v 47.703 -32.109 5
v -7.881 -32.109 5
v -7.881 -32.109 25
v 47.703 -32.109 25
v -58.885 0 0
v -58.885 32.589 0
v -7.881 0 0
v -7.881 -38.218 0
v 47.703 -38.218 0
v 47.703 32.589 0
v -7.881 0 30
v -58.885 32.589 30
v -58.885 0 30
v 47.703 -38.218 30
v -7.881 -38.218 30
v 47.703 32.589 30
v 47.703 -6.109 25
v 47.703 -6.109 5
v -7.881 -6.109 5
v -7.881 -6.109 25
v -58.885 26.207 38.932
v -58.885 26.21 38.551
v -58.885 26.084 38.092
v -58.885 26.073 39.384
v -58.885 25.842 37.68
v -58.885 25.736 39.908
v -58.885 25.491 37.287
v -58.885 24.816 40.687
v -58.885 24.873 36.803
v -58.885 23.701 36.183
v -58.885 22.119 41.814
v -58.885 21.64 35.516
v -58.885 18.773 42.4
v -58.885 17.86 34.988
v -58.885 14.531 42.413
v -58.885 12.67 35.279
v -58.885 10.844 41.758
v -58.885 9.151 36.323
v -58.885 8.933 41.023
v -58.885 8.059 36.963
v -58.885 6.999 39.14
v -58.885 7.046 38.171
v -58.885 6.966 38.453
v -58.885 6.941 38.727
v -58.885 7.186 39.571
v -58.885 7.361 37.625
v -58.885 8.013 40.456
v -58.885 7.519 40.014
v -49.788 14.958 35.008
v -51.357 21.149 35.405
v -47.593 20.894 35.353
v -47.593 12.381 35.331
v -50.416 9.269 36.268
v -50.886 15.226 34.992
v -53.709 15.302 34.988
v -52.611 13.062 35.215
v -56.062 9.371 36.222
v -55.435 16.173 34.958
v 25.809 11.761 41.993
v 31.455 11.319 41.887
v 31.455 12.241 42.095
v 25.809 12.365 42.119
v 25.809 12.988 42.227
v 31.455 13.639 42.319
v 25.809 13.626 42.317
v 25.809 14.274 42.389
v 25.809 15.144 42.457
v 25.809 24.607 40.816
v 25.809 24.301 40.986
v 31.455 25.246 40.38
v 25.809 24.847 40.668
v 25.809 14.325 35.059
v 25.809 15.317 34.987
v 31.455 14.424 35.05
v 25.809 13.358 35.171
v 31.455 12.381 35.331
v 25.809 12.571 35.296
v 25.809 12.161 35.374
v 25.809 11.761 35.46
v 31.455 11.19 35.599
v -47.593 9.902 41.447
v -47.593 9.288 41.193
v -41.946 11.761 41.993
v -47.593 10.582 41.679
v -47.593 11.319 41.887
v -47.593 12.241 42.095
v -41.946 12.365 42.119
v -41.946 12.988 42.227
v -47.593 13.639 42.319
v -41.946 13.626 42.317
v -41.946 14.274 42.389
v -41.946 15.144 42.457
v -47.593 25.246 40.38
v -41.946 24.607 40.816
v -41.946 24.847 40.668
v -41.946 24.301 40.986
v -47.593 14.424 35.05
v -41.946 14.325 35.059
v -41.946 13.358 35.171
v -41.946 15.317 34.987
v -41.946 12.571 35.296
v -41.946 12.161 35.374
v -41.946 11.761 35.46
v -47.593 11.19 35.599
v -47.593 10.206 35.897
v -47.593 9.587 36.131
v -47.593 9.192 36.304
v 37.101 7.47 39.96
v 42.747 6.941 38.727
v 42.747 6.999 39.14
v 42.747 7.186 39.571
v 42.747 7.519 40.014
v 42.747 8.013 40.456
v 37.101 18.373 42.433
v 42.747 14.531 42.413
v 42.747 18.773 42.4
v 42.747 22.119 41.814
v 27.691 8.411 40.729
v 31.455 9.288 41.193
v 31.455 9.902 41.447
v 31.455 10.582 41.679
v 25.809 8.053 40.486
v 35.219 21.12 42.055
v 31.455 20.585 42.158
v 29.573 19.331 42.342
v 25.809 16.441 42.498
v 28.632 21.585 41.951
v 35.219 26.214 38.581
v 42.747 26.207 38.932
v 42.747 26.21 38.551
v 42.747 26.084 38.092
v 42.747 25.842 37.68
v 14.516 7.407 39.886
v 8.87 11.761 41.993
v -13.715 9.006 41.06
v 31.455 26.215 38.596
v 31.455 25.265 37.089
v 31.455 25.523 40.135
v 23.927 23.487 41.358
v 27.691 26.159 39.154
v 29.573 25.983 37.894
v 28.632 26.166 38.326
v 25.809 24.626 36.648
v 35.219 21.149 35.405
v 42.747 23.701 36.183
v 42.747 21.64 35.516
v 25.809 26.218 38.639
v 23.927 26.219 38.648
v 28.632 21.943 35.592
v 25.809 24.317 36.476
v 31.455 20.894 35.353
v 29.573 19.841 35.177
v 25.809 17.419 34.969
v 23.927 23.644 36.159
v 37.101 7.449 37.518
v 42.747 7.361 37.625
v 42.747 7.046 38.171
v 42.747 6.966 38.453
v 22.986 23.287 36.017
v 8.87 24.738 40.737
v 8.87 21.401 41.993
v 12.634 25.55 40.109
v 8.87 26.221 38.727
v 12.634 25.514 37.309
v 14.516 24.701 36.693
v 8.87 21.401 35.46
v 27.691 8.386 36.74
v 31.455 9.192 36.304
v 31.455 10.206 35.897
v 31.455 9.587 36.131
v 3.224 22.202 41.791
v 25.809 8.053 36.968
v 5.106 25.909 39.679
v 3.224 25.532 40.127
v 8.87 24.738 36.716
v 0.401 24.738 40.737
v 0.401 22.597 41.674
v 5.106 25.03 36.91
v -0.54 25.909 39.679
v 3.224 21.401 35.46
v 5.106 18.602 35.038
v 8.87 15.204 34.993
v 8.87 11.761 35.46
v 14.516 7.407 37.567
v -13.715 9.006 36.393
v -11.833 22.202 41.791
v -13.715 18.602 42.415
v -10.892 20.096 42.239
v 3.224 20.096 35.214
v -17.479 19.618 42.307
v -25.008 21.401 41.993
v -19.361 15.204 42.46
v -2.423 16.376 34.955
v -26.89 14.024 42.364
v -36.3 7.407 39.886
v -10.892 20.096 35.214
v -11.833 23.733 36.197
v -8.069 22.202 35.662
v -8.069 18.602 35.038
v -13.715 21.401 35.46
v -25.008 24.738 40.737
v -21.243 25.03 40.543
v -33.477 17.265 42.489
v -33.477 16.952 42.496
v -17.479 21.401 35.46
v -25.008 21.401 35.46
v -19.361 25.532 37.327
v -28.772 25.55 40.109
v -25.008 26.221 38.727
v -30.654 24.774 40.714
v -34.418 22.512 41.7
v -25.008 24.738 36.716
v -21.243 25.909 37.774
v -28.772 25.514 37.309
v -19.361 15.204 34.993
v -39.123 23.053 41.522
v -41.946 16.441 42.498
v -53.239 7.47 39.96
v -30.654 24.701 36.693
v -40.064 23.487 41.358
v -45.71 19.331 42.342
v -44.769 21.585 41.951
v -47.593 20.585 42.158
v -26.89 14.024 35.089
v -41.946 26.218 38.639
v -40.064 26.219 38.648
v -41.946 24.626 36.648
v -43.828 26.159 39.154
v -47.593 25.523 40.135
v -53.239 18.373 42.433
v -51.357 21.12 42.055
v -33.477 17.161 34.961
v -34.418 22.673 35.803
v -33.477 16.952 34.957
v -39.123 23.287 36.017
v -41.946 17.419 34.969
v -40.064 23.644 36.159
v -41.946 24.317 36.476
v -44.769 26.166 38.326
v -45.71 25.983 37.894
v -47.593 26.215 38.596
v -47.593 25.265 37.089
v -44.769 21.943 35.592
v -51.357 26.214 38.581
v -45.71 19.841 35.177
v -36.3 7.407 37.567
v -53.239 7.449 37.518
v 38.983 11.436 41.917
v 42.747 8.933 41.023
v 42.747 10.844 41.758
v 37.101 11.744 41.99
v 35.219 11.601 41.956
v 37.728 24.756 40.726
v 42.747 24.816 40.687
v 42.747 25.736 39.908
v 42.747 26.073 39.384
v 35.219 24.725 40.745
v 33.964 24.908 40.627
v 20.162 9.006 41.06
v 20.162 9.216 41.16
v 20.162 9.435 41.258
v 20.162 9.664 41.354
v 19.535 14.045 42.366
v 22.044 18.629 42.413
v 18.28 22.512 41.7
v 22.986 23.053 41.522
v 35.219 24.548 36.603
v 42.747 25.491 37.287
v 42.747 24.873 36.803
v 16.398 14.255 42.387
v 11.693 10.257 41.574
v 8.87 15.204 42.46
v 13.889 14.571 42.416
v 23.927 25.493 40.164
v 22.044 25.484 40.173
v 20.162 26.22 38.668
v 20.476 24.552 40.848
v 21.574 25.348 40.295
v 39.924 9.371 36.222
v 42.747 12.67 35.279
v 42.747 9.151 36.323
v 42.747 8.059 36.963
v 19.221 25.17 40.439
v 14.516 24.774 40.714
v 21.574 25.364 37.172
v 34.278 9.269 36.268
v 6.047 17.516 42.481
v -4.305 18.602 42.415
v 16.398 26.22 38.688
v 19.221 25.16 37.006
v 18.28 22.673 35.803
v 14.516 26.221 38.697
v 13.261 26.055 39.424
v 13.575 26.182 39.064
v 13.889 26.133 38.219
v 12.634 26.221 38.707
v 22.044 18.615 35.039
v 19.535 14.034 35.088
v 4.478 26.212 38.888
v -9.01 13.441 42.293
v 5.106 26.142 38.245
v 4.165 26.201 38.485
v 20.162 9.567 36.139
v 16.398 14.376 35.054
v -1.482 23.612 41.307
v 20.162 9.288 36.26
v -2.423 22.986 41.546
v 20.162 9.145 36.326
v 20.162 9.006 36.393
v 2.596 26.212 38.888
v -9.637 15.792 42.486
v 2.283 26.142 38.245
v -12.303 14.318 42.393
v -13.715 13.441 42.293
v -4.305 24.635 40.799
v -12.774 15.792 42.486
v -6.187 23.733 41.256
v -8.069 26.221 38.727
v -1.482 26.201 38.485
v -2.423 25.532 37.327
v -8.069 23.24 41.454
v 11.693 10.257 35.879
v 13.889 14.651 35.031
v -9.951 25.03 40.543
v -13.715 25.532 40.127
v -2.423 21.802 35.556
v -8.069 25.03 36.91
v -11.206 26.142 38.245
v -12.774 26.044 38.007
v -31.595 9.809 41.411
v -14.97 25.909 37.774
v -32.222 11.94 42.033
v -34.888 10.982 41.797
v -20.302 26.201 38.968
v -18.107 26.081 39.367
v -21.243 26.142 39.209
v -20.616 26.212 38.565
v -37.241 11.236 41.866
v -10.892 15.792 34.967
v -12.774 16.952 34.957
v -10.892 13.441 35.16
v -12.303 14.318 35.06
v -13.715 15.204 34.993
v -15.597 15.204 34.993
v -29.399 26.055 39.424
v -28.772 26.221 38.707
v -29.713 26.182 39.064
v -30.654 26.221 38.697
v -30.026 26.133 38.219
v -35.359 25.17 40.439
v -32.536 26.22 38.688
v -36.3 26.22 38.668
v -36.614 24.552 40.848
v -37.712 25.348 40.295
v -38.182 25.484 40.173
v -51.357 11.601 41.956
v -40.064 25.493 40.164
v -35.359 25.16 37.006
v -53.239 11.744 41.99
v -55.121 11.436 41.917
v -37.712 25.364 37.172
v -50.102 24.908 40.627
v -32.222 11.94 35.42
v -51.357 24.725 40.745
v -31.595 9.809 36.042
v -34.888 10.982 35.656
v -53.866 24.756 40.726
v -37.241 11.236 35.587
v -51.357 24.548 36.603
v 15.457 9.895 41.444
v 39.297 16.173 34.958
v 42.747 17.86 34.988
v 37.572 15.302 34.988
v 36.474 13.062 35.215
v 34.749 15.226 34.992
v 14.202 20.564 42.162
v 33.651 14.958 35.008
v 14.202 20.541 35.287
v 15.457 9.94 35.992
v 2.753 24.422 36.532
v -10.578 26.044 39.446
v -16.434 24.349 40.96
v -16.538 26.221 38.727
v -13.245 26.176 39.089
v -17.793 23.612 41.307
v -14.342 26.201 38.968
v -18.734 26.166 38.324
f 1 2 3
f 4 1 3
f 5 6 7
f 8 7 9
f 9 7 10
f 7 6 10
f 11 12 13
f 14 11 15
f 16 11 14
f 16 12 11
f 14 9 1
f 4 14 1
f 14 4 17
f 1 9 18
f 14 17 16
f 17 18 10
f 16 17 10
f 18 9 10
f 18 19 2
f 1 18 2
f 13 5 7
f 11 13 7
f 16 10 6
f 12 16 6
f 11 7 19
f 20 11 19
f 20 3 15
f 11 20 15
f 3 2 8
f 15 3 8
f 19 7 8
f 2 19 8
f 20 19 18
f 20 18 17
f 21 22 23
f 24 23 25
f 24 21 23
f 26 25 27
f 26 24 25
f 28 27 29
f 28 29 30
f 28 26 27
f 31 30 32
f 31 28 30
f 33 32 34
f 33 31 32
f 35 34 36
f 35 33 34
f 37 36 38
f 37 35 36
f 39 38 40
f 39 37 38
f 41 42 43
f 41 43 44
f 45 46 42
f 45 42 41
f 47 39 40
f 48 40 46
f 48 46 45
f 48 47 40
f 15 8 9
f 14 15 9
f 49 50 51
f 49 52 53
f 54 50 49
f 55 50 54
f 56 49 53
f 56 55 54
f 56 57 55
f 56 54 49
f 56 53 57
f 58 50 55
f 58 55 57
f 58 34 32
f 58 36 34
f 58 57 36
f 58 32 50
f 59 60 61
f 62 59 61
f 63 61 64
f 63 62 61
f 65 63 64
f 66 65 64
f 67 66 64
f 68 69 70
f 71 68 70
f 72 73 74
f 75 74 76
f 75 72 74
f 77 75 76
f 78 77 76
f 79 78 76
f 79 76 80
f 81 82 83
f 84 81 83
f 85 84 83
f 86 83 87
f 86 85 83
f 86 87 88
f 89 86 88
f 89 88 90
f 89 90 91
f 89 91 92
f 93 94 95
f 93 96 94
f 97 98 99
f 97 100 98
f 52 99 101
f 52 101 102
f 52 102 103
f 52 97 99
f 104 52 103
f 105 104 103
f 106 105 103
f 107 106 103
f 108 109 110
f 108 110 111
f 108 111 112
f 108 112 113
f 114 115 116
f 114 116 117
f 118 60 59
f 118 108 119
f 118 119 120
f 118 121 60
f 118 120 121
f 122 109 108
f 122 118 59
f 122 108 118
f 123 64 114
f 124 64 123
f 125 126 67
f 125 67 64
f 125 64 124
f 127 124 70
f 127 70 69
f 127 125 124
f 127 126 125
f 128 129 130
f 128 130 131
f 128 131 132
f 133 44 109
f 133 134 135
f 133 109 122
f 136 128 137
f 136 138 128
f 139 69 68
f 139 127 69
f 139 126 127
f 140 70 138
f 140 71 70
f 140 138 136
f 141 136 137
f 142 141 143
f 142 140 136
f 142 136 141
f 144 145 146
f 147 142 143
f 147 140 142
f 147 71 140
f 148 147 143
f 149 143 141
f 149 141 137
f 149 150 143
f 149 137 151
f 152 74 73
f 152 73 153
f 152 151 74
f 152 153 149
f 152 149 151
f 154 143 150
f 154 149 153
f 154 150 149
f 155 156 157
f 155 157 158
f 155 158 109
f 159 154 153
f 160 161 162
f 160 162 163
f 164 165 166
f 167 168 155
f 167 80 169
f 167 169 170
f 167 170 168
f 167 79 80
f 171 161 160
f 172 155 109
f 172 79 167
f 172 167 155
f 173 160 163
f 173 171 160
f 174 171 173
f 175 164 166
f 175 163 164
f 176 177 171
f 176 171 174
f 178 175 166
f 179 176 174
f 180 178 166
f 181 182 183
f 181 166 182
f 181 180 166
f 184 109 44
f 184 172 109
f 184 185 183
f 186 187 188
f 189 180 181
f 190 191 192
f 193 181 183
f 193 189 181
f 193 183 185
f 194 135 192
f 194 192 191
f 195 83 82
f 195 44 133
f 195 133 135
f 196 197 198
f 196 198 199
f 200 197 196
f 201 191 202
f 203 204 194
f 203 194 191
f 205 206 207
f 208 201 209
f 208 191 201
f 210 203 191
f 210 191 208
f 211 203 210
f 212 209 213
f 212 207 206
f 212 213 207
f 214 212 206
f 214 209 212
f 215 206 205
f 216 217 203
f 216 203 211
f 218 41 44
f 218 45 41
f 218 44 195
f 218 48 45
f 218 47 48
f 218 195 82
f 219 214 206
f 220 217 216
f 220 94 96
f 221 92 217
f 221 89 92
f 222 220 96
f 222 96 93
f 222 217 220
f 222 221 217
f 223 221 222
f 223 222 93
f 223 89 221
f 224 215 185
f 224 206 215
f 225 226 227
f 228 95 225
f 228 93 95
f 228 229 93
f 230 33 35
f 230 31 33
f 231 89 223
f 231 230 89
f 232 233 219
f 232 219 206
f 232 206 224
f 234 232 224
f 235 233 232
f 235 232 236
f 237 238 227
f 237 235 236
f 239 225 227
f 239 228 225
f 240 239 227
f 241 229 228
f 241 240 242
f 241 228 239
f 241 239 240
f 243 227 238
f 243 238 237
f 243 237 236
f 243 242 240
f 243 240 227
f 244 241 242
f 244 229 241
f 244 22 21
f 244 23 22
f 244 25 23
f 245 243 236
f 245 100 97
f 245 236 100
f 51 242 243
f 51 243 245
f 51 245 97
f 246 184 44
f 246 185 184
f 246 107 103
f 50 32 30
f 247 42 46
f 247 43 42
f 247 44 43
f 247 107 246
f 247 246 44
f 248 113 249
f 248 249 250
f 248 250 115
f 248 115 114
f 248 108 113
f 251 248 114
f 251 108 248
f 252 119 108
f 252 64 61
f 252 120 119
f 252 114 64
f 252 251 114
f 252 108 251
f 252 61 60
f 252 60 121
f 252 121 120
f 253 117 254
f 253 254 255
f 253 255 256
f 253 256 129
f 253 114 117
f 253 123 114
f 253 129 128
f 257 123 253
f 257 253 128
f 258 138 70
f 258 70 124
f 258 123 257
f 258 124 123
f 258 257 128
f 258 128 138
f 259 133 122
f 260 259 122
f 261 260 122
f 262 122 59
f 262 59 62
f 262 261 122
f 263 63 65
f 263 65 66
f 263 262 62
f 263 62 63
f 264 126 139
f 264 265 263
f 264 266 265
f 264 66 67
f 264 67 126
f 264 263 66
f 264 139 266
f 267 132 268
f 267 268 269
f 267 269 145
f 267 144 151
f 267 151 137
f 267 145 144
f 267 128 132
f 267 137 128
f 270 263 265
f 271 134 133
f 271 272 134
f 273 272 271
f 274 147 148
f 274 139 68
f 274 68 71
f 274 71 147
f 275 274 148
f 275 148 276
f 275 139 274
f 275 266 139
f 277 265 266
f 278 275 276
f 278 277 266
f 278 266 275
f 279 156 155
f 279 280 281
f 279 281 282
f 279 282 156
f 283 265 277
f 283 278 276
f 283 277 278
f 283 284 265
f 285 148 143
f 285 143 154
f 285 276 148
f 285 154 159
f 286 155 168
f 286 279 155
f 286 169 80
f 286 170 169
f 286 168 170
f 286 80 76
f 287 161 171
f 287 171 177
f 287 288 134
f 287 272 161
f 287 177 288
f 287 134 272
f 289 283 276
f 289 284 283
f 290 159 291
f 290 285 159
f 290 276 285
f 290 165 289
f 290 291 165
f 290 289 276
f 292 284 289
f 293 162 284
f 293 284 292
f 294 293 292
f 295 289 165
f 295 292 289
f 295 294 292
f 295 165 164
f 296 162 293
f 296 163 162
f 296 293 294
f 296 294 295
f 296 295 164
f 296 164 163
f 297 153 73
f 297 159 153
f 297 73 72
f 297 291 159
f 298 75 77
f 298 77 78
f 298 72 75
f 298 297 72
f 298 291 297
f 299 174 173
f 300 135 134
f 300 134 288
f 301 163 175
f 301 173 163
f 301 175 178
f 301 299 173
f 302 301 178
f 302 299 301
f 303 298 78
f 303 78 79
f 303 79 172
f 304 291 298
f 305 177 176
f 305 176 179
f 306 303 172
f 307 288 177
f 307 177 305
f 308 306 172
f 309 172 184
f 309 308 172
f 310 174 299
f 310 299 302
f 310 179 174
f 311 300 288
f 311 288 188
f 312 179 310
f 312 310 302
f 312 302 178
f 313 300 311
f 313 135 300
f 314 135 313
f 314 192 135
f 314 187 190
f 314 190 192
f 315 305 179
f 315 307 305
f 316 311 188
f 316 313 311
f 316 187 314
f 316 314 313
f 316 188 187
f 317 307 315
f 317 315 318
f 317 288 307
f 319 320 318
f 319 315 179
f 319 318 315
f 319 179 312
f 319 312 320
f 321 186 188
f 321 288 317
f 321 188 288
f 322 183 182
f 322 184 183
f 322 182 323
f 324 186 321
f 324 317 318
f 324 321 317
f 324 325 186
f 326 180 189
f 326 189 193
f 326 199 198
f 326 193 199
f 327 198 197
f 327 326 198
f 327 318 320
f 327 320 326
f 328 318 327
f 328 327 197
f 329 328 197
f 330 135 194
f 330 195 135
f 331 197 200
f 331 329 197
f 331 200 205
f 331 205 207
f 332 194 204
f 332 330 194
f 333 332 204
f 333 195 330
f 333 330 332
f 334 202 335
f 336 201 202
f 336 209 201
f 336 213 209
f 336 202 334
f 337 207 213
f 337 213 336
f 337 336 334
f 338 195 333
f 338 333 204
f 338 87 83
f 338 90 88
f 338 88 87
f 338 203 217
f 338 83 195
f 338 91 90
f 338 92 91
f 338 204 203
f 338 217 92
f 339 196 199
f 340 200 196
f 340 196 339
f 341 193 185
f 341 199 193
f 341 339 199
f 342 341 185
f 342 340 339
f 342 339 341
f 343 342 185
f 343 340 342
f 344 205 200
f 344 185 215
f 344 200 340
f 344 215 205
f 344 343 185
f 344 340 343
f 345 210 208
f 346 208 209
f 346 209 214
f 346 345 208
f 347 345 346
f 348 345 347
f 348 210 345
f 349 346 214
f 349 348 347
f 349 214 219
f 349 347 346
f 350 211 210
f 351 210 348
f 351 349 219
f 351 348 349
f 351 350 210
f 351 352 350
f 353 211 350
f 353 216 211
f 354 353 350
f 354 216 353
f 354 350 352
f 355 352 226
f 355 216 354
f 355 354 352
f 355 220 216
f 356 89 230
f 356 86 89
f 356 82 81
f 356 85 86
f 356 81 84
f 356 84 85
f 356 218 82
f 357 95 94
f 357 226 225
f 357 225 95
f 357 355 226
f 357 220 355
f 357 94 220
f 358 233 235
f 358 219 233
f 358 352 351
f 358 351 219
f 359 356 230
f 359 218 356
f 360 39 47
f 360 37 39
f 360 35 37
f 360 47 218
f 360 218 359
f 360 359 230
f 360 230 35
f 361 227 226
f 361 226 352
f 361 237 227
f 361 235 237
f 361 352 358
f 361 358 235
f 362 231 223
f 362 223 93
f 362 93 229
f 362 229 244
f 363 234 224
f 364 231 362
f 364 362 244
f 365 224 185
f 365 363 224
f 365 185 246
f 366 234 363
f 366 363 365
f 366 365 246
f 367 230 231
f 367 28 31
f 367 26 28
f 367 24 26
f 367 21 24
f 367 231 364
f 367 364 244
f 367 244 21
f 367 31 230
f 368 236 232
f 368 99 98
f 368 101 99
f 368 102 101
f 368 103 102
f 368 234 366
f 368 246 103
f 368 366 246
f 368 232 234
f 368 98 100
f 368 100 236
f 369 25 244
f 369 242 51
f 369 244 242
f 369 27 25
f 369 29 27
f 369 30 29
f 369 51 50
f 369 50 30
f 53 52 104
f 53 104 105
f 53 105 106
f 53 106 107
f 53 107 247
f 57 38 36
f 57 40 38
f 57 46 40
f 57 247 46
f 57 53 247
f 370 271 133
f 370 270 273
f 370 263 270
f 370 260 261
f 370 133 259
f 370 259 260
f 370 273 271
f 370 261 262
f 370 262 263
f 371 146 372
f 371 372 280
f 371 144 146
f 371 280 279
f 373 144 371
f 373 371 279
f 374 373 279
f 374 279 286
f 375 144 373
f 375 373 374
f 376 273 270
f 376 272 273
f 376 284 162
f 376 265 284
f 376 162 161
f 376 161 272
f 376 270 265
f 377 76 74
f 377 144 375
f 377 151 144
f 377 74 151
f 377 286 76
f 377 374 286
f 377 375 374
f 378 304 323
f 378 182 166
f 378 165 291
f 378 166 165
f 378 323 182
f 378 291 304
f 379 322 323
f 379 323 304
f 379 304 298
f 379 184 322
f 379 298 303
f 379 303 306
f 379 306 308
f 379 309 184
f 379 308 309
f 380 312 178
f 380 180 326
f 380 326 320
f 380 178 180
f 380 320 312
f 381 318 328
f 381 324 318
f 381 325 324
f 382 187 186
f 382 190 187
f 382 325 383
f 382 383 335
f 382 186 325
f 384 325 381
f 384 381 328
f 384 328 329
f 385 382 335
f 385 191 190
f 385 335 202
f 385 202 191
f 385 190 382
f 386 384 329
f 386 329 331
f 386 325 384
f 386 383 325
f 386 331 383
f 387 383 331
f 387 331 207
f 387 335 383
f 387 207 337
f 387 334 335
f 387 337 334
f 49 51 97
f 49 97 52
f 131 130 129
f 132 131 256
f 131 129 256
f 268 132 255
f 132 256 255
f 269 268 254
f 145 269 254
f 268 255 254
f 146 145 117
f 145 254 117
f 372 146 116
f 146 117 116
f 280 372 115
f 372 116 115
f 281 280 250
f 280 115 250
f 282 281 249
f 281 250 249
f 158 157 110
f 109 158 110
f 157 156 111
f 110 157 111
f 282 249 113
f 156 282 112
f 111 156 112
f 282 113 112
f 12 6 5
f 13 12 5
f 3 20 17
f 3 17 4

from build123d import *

# Parameters (mm, degrees)
F1_DEPTH = 30
F2_W     = 26
F2_H     = 20
F3_DEPTH = 55.584419
F5_DEPTH = 101.63239


with BuildPart() as f1:
    # F0 (on Top) → F1 (new body)
    with BuildSketch(Plane.XY):
        Polygon((47.702593, 32.588766), (-58.88501, 32.588766), (-58.88501, 0), (-7.880825, 0), (-7.880825, -38.217835), (47.702593, -38.217835), align=None)
    extrude(amount=F1_DEPTH)

    # F2 (on face) → F3 (cut, through all)
    with BuildSketch(Plane(origin=(-7.880825, 0, 0), x_dir=(0, -1, 0), z_dir=(-1, 0, 0))):
        with Locations((19.108918, 15)):
            Rectangle(F2_W, F2_H)
    extrude(amount=-F3_DEPTH, mode=Mode.SUBTRACT)


with BuildPart() as f5:
    # F4 (on face) → F5 (new body)
    with BuildSketch(Plane(origin=(-58.88501, 0, 0), x_dir=(0, -1, 0), z_dir=(-1, 0, 0))):
        with BuildLine():
            add(Edge.make_bspline(
                [(-6.940764, 38.726609), (-6.940764, 45.260255), (-21.400879, 41.993432), (-35.860993, 38.726609), (-21.400879, 35.459786), (-6.940764, 32.192963), (-6.940764, 38.726609)],
                knots=[0, 0, 0, 2.094395, 2.094395, 4.18879, 4.18879, 6.283185, 6.283185, 6.283185], degree=2, weights=[1, 0.5, 1, 0.5, 1, 0.5, 1]))
        make_face()
    extrude(amount=-F5_DEPTH)


solid = Compound([f1.part, f5.part])
